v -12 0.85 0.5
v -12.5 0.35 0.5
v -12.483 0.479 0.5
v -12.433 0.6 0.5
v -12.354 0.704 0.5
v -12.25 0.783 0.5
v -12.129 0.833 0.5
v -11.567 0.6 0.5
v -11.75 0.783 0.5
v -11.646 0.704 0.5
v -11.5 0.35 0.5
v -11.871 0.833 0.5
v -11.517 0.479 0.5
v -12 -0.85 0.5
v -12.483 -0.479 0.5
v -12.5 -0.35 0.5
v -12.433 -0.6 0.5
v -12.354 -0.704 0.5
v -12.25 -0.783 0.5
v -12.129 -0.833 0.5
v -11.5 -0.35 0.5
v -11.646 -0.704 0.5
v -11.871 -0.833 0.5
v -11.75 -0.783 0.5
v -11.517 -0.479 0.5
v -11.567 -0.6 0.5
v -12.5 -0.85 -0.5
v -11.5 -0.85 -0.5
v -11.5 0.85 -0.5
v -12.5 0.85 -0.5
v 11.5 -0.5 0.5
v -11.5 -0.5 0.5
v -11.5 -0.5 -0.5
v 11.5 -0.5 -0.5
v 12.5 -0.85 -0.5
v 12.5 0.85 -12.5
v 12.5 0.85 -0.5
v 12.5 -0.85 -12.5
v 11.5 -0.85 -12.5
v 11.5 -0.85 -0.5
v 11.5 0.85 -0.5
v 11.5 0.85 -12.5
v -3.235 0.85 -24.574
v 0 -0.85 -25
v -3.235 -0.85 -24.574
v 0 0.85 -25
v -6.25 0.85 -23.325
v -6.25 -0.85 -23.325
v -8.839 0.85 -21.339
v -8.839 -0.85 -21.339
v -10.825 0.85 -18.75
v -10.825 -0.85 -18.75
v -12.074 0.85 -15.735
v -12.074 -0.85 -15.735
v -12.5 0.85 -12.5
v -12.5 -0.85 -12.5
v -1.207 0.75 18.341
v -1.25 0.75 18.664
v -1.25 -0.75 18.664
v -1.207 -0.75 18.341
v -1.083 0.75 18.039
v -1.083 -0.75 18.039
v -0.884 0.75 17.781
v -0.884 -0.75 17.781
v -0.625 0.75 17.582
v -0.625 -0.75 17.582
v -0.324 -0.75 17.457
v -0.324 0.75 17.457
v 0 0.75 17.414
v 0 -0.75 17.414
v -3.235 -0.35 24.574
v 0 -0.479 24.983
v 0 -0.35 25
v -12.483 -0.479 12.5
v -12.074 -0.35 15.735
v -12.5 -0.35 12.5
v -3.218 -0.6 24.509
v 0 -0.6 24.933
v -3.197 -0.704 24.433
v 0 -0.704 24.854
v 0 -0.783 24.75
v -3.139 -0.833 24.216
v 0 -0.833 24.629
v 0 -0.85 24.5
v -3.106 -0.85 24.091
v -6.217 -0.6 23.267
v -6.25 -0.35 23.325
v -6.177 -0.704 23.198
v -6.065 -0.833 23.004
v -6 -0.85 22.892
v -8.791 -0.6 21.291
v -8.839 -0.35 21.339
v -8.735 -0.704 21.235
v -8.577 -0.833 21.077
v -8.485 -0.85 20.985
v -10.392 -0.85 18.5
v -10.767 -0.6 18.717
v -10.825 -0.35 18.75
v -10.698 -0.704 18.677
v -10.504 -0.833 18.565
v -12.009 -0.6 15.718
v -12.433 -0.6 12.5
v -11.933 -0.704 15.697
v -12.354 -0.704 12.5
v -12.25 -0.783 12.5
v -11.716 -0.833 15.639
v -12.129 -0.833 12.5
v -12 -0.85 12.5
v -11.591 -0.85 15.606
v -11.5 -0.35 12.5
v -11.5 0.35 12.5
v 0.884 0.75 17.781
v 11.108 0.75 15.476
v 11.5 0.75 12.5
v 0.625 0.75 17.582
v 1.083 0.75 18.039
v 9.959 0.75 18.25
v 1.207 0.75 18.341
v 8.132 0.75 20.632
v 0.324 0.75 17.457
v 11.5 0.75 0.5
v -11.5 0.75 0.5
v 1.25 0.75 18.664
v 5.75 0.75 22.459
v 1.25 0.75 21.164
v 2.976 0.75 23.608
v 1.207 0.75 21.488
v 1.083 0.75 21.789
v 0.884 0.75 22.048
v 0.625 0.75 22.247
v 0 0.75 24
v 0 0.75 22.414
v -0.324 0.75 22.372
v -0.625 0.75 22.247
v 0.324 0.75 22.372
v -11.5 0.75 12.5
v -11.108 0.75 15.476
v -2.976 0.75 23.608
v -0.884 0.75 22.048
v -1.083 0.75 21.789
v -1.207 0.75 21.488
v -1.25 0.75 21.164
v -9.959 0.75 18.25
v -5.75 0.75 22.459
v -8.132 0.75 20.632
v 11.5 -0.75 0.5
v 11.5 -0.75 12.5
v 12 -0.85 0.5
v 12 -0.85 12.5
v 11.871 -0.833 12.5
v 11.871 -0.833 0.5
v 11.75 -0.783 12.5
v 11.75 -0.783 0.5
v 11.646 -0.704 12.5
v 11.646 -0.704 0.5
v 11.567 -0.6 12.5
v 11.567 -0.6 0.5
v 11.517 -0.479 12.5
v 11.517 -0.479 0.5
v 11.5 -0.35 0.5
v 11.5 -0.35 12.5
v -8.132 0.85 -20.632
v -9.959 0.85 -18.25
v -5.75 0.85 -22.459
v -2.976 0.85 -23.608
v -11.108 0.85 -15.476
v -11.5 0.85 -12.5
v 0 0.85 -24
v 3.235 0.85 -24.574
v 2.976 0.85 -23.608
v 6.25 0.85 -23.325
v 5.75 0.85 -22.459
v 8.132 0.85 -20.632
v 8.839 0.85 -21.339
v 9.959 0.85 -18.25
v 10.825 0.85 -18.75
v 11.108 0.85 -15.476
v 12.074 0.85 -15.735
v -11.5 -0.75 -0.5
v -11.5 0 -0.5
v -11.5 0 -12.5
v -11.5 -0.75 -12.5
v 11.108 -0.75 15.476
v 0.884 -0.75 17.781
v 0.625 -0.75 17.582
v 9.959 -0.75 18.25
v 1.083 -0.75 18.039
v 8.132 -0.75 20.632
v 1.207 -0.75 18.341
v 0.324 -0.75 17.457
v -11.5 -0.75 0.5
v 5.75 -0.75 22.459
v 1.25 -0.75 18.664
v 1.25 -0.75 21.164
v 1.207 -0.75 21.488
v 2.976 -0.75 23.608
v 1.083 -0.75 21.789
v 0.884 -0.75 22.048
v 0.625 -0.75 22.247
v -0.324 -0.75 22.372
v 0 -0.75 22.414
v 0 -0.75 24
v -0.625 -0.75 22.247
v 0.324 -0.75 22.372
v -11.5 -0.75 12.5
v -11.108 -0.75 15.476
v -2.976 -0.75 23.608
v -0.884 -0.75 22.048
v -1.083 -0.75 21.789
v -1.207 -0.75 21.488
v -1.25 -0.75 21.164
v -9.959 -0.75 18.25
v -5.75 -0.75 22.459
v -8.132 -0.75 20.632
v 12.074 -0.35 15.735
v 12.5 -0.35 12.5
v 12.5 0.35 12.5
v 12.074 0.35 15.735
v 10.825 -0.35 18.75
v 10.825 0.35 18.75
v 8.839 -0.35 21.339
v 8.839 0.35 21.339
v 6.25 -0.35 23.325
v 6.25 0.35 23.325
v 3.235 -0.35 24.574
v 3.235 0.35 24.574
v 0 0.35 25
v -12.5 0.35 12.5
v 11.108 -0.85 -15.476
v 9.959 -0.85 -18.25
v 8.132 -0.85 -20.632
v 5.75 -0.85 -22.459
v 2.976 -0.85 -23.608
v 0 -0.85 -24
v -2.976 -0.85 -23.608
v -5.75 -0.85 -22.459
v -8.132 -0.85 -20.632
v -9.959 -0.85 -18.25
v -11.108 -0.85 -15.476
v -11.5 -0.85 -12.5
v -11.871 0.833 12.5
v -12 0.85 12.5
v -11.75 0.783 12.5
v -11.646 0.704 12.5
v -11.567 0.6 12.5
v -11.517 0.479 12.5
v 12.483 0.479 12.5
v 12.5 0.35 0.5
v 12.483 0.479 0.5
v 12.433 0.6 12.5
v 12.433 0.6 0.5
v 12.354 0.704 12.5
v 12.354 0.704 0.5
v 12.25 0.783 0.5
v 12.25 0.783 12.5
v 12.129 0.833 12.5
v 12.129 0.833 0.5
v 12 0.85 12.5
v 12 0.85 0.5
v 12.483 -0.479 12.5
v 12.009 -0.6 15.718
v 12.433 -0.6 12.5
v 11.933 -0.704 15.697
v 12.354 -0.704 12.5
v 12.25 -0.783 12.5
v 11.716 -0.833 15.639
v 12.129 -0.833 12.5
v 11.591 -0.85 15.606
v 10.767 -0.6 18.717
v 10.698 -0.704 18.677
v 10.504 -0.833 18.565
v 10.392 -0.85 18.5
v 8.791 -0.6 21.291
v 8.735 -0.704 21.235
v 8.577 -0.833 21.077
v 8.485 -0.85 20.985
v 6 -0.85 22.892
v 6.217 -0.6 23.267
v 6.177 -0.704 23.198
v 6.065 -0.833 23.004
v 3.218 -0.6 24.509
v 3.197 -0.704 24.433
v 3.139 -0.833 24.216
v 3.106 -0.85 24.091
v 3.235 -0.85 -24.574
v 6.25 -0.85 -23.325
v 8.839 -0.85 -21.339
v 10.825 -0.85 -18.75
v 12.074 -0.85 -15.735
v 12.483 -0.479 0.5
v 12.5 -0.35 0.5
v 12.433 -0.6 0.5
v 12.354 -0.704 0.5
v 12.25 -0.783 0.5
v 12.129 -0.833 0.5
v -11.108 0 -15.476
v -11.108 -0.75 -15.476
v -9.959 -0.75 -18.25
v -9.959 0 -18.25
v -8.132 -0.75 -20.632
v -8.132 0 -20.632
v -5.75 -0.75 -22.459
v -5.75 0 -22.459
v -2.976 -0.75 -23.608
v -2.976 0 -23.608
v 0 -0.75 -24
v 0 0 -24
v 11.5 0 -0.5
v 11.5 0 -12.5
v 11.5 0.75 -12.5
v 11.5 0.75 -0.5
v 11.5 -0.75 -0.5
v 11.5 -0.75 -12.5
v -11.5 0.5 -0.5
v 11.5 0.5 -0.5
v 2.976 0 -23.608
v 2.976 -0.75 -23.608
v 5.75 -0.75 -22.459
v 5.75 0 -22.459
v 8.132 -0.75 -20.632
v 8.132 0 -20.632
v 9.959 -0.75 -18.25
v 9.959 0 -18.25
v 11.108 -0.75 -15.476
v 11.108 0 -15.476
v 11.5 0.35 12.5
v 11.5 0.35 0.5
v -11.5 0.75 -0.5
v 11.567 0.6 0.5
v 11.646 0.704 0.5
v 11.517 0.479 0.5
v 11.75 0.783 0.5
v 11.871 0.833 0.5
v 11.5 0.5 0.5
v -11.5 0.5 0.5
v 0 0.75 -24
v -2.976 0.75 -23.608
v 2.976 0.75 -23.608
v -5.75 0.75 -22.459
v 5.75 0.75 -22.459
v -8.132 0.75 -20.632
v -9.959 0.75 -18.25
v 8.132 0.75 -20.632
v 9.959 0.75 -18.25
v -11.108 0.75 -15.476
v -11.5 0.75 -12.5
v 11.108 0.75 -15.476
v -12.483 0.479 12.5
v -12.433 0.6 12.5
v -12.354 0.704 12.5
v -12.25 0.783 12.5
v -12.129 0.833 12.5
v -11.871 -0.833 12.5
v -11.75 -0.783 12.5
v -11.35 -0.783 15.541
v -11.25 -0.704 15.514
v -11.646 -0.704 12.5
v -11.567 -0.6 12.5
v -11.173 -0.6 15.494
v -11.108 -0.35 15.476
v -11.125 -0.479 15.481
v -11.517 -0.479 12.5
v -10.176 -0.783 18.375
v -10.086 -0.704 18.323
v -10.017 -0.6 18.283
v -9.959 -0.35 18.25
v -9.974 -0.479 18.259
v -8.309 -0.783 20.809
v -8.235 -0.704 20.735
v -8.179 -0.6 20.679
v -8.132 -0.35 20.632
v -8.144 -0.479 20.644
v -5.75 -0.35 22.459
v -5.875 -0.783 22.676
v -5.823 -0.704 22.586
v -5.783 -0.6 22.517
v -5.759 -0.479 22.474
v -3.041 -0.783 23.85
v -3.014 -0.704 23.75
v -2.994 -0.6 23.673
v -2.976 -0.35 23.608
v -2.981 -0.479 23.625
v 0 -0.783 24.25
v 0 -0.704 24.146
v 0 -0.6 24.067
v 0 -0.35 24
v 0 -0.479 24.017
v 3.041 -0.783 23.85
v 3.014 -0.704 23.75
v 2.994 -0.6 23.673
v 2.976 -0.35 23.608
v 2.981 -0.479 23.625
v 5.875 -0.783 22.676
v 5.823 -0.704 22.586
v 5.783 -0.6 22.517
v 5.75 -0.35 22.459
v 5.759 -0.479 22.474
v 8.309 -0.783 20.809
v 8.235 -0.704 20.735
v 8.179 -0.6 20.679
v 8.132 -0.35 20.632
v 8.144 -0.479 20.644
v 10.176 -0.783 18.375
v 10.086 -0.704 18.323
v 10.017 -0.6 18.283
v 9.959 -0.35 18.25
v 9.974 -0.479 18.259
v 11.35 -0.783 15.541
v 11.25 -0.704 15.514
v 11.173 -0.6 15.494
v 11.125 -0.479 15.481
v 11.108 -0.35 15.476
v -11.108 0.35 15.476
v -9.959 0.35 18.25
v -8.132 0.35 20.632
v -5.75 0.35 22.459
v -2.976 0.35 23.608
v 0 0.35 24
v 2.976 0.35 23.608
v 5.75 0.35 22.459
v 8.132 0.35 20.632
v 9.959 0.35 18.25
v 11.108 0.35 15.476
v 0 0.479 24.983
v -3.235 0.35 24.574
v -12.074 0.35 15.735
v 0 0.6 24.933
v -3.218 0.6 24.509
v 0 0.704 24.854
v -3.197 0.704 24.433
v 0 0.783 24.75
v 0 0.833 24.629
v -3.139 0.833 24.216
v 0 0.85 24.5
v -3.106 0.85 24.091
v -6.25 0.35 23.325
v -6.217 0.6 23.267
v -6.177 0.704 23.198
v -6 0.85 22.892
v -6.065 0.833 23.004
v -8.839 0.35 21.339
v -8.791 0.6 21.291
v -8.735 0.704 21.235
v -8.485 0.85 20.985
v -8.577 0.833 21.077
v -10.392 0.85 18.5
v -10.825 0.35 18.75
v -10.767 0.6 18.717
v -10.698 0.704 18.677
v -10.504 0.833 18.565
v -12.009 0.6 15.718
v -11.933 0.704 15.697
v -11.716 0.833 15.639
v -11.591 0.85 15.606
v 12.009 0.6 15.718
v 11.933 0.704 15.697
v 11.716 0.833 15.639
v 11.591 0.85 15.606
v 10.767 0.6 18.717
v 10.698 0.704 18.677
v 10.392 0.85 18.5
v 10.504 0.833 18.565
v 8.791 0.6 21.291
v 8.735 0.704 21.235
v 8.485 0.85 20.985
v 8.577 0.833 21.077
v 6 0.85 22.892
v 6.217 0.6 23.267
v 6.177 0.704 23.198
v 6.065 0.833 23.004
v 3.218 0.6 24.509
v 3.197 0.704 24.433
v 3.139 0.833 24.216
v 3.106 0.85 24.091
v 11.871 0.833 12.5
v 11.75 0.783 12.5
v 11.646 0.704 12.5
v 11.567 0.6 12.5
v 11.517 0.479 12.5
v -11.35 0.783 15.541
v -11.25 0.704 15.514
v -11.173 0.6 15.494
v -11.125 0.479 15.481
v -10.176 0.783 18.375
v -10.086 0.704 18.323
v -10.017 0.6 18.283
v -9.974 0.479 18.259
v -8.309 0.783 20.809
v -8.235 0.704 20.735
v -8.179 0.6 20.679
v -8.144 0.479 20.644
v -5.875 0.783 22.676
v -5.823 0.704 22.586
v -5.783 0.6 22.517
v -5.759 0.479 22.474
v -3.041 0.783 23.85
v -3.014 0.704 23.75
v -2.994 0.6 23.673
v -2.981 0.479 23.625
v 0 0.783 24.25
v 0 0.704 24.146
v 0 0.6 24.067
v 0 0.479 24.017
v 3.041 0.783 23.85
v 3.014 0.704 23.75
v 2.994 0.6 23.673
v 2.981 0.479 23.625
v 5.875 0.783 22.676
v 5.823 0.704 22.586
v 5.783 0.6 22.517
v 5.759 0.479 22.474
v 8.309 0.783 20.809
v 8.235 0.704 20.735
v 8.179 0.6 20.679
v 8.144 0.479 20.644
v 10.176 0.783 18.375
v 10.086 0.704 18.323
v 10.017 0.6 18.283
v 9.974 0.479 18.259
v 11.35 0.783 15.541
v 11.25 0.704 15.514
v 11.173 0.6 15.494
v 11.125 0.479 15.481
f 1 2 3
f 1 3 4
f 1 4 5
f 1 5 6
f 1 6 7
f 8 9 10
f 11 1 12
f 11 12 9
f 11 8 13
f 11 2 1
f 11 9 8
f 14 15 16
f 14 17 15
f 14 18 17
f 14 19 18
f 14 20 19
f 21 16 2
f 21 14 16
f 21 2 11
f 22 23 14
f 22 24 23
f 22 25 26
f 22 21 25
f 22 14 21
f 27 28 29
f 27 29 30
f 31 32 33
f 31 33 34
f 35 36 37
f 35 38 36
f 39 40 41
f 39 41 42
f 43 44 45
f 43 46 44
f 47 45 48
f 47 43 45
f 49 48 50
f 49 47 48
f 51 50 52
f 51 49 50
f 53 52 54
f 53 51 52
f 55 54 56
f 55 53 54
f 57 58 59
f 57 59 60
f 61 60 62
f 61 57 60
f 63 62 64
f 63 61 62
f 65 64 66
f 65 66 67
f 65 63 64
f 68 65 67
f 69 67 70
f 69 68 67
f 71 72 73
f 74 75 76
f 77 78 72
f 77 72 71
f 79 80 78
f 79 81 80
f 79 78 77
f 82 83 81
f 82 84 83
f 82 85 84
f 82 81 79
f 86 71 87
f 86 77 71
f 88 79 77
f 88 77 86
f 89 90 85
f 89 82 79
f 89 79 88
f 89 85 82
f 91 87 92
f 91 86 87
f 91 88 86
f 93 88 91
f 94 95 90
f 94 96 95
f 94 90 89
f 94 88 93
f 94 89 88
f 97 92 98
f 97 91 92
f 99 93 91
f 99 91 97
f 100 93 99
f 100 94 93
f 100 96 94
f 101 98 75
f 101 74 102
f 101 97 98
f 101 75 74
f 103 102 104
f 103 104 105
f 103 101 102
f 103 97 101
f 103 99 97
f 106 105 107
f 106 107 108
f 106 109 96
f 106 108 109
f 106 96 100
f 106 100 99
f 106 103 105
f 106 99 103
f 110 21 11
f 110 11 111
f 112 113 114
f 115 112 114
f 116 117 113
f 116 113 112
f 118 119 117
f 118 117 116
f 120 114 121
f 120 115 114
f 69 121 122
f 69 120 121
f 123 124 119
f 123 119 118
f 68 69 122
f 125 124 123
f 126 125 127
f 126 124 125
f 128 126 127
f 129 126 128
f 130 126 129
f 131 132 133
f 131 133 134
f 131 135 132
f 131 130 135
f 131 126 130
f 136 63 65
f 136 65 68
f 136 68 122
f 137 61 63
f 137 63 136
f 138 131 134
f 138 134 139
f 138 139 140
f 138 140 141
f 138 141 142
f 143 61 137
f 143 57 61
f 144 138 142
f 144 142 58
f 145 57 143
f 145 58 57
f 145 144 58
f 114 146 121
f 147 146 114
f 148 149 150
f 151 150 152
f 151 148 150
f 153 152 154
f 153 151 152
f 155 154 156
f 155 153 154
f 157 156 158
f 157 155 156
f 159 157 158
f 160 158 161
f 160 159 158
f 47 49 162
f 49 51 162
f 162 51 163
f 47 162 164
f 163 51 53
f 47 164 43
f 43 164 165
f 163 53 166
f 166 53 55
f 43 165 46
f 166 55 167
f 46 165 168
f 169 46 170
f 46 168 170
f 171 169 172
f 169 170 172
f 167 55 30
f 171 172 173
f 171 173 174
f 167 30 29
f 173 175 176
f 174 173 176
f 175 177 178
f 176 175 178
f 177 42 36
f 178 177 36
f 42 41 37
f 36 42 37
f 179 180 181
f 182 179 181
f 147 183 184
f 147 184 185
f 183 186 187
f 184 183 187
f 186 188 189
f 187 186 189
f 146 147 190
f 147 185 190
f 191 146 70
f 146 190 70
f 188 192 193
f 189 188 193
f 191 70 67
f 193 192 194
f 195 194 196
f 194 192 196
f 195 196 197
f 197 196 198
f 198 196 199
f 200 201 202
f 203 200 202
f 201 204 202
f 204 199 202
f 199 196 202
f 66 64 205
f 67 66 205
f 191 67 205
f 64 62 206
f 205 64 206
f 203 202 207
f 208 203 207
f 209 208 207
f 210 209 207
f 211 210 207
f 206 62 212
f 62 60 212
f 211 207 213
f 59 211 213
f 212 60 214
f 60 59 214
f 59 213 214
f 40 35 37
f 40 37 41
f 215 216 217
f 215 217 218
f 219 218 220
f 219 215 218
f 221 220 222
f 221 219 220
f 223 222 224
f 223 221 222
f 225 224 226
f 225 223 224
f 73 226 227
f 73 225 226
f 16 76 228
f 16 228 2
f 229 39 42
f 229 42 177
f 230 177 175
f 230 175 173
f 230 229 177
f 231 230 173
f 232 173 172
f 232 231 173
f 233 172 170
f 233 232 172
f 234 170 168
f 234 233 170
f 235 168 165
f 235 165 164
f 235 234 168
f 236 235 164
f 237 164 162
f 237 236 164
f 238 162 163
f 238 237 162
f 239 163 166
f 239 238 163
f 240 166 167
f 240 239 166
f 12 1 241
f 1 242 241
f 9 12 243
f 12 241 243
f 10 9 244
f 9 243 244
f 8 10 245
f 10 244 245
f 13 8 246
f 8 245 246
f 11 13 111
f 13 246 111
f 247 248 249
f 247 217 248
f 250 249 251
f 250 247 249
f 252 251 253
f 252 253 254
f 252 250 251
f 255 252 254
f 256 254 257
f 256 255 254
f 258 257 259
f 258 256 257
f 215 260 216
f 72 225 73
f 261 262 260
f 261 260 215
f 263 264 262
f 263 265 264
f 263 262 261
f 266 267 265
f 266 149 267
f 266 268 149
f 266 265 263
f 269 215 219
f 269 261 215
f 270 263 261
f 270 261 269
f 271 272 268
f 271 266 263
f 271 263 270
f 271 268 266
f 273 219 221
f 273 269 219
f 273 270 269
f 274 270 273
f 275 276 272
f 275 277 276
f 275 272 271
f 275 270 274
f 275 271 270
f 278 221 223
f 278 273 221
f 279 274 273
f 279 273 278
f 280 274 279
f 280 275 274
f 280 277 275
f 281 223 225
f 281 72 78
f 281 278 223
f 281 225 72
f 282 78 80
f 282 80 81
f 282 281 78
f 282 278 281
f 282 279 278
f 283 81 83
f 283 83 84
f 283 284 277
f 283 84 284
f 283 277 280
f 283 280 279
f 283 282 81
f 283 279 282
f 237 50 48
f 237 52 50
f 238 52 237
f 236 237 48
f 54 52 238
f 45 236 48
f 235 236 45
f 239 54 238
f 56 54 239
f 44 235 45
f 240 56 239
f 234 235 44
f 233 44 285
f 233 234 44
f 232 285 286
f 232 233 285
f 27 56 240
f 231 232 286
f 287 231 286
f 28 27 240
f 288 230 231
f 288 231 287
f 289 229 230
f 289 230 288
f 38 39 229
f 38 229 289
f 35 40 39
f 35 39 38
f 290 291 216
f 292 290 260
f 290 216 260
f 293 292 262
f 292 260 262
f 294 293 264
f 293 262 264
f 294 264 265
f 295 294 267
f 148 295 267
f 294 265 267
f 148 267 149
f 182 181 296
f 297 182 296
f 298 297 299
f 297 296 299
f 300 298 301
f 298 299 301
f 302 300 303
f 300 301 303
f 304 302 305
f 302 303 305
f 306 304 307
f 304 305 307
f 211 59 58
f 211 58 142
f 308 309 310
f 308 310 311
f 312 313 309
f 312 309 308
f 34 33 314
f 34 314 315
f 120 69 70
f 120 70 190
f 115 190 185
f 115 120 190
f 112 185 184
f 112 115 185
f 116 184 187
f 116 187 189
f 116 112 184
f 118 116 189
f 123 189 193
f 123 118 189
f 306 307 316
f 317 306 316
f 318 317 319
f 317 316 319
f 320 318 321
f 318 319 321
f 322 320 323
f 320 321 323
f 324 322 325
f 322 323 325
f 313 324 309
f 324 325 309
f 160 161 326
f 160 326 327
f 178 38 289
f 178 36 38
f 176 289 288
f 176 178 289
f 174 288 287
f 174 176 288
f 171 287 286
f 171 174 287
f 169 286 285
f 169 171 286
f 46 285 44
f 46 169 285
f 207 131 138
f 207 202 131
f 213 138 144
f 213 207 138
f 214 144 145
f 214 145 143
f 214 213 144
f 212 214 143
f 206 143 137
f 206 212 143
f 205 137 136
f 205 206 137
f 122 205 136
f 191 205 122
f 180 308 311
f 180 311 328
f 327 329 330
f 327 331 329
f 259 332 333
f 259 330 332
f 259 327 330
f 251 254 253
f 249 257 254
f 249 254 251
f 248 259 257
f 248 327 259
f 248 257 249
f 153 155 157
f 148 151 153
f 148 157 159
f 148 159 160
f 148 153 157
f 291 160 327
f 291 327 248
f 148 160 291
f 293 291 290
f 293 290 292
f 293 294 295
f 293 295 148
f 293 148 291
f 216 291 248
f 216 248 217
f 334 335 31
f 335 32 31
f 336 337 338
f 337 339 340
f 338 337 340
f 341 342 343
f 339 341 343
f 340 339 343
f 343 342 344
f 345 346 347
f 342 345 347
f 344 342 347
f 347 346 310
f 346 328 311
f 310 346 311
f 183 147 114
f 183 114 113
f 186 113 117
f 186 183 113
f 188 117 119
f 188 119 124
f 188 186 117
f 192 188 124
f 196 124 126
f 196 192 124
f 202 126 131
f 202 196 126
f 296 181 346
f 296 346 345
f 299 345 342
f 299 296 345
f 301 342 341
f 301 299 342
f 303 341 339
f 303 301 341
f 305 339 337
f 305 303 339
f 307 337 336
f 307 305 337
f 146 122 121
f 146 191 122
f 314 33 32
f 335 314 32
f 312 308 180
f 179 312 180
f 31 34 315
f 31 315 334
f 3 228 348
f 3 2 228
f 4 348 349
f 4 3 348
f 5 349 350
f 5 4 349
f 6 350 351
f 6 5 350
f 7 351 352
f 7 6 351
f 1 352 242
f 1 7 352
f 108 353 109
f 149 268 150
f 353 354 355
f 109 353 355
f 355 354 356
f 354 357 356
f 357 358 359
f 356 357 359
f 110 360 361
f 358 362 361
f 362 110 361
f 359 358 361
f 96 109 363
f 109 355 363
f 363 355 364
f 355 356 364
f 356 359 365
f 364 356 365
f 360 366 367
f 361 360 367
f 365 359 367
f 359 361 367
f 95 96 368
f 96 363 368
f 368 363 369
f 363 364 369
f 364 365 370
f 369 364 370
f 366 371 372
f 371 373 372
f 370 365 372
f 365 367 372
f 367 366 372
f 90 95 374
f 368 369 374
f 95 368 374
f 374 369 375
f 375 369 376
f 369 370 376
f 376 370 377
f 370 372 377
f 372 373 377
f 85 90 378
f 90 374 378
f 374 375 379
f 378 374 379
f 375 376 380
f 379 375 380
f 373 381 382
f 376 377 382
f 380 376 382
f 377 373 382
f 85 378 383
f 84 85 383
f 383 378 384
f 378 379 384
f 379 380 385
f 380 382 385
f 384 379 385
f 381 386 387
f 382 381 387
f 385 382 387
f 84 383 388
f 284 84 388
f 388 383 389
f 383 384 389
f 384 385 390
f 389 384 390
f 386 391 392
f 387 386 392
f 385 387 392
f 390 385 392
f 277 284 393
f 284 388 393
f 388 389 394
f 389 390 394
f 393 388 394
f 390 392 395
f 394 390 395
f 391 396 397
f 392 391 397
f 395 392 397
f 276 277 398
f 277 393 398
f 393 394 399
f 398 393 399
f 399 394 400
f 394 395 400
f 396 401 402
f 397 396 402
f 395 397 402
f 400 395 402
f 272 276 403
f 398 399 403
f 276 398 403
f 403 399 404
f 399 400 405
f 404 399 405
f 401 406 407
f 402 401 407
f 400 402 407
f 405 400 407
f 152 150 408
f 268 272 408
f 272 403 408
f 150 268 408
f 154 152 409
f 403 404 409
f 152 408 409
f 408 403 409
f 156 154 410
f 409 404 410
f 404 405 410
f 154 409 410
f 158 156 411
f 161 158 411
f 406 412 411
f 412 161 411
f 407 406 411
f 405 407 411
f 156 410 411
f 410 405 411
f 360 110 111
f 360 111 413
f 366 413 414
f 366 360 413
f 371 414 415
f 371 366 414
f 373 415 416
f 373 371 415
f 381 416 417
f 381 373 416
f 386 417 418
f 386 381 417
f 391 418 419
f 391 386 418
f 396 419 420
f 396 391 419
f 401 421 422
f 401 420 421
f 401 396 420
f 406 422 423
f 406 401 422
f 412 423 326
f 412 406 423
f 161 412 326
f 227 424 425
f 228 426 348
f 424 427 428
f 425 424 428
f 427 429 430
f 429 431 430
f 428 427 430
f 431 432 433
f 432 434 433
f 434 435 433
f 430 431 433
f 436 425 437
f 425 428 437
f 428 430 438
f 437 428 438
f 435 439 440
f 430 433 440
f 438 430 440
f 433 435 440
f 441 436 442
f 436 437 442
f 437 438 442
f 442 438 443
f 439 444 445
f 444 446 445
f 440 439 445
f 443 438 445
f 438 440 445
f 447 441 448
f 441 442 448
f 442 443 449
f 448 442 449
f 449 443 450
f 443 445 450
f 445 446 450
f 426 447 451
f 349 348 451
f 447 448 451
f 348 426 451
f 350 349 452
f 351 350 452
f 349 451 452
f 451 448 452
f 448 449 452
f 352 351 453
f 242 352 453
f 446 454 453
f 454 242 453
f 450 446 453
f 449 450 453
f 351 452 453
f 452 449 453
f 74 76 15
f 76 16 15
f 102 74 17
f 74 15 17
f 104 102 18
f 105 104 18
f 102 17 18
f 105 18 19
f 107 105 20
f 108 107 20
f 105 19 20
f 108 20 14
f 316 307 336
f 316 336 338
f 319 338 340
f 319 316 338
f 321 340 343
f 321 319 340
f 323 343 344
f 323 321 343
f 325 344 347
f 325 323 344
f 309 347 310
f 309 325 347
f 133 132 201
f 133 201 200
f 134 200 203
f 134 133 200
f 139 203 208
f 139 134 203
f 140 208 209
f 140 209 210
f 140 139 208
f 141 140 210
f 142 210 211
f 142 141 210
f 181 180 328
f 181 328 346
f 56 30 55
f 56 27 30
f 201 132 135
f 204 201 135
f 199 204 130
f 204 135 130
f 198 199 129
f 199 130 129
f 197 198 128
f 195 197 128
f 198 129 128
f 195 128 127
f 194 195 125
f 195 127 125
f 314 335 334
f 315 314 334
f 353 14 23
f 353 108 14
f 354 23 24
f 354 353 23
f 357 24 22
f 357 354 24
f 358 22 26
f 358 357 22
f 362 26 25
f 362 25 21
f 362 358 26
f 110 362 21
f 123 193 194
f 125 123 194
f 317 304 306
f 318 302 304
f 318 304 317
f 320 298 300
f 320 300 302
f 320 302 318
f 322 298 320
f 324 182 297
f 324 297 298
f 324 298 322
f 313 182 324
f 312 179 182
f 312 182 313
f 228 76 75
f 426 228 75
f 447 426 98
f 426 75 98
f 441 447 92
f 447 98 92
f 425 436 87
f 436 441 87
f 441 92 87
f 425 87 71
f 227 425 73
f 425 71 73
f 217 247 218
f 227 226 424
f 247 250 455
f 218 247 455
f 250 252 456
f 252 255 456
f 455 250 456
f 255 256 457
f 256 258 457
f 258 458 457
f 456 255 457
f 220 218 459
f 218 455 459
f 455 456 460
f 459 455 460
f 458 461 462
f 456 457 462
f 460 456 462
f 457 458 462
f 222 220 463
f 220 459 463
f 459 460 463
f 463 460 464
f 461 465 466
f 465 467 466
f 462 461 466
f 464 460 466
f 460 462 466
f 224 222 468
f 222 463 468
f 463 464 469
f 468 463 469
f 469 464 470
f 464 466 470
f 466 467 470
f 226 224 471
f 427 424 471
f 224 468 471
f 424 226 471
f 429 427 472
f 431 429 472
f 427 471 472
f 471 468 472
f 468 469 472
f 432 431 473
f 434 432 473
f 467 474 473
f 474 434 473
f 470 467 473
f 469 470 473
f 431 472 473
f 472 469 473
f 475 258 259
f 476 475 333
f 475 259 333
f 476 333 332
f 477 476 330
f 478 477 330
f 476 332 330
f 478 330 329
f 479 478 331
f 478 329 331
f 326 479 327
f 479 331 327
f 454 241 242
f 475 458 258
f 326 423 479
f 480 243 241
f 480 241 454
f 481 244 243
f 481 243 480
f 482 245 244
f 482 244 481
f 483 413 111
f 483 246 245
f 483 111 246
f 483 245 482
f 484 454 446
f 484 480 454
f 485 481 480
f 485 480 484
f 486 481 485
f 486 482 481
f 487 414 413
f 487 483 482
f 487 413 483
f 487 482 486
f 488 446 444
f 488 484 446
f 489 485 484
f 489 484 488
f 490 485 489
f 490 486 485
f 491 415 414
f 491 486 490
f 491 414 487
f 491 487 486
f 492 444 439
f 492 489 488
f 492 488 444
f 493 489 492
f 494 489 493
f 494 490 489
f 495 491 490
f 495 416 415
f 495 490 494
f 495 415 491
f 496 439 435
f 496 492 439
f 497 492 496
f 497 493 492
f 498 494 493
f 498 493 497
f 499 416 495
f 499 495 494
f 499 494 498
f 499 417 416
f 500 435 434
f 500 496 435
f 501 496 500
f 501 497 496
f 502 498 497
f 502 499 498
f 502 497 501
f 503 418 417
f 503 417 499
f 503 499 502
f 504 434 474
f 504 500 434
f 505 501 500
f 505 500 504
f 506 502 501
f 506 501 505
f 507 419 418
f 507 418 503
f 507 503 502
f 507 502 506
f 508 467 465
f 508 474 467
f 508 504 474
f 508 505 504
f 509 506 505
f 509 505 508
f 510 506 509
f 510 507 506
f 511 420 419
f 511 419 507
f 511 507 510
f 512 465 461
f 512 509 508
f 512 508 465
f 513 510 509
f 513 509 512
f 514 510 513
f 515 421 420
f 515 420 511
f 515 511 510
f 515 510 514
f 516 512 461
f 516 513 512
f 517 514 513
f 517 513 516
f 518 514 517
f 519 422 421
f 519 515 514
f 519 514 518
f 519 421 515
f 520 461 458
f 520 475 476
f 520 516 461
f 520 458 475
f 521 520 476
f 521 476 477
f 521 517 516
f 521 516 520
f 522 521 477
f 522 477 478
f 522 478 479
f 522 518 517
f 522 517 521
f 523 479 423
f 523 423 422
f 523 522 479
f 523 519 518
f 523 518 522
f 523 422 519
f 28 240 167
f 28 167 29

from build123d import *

# Parameters (mm, degrees)
F1_DEPTH      = 0.85
F1_DEPTH_BACK = 0.85
F2_R          = 12.49999
F2_2_R        = 12.49999
F0_W          = 23
F0_H          = 1
F3_DEPTH      = 0.5
F3_DEPTH_BACK = 0.5
F0_W_2        = 2.5
F0_H_2        = 5
F4_DEPTH      = 0.75
F4_DEPTH_BACK = 0.75
F5_T1_DEPTH   = 1.5
F6_R          = 0.49999


# Not quite as in the source:
# - a fillet or chamfer that OpenCascade refuses, or shapes differently, is made with other operations: its cross-section is extruded or revolved along the edge and cut away or added
# - a fillet or chamfer is up to 0.001 mm smaller than in the source, because OpenCascade refuses the exact size
# - a feature names something its author has since deleted; it is built from what else it names


with BuildPart() as f1:
    # F0 (on Front) → F1 (new body, two sides)
    with BuildSketch(Plane.XZ) as f1_sk:
        with BuildLine():
            Line((12.5, 0.5), (12.5, 25))
            Line((12.5, 25), (-12.5, 25))
            Line((-12.5, 25), (-12.5, 0.5))
            Line((-12.5, 0.5), (-11.5, 0.5))
            Line((-11.5, 0.5), (-11.5, 12.5))
            ThreePointArc((-11.5, 12.5), (-8.1317279836, 20.6317279836), (0, 24))
            ThreePointArc((0, 24), (8.1317279836, 20.6317279836), (11.5, 12.5))
            Line((11.5, 12.5), (11.5, 0.5))
            Line((11.5, 0.5), (12.5, 0.5))
        make_face()
    extrude(amount=F1_DEPTH)
    extrude(f1_sk.sketch, amount=-F1_DEPTH_BACK)

    # F2 (radius 12.5 in the source; OpenCascade refuses exactly that, so slightly less here)
    f2_edges = [f1.edges().sort_by_distance(p)[0] for p in [
        (12.5, 0, 25),
        (-12.5, 0, 25),
    ]]
    fillet(f2_edges, radius=F2_R)

    # F6 (radius 0.5 in the source; OpenCascade refuses exactly that, so slightly less here)
    f6_edges = [f1.edges().sort_by_distance(p)[0] for p in [
        (8.838838, -0.85, 21.338838),
        (12.5, -0.85, 6.500005),
        (12.5, 0.85, 6.500005),
        (8.838838, 0.85, 21.338838),
        (-12.5, -0.85, 6.500005),
        (-12.5, 0.85, 6.500005),
        (-11.5, -0.85, 6.5),
        (0, -0.85, 24),
        (11.5, 0.85, 6.5),
        (0, 0.85, 24),
        (-11.5, 0.85, 6.5),
        (11.5, -0.85, 6.5),
        (0, -0.85, 25),
        (-8.838838, -0.85, 21.338838),
        (0, 0.85, 25),
        (-8.838838, 0.85, 21.338838),
    ]]
    fillet(f6_edges, radius=F6_R)


with BuildPart() as f1b:
    # F0 (on Front) → F1, piece 2 (new body, two sides)
    with BuildSketch(Plane.XZ) as f1_2_sk:
        with BuildLine():
            Line((12.5, -25), (12.5, -0.5))
            Line((12.5, -0.5), (11.5, -0.5))
            Line((11.5, -0.5), (11.5, -12.5))
            ThreePointArc((11.5, -12.5), (8.1317279836, -20.6317279836), (0, -24))
            ThreePointArc((0, -24), (-8.1317279836, -20.6317279836), (-11.5, -12.5))
            Line((-11.5, -12.5), (-11.5, -0.5))
            Line((-11.5, -0.5), (-12.5, -0.5))
            Line((-12.5, -0.5), (-12.5, -25))
            Line((-12.5, -25), (12.5, -25))
        make_face()
    extrude(amount=F1_DEPTH)
    extrude(f1_2_sk.sketch, amount=-F1_DEPTH_BACK)

    # F2#2 (radius 12.5 in the source; OpenCascade refuses exactly that, so slightly less here)
    f2_2_edges = [f1b.edges().sort_by_distance(p)[0] for p in [
        (12.5, 0, -25),
        (-12.5, 0, -25),
    ]]
    fillet(f2_2_edges, radius=F2_2_R)


with BuildPart() as f3:
    # F0 (on Front) → F3 (new body, two sides)
    with BuildSketch(Plane.XZ) as f3_sk:
        Rectangle(F0_W, F0_H)
    extrude(amount=F3_DEPTH)
    extrude(f3_sk.sketch, amount=-F3_DEPTH_BACK)


with BuildPart() as f4:
    # F0 (on Front) → F4 (new body, two sides)
    with BuildSketch(Plane.XZ) as f4_sk:
        with BuildLine():
            Line((-11.5, 0.5), (11.5, 0.5))
            Line((11.5, 0.5), (11.5, 12.5))
            ThreePointArc((11.5, 12.5), (8.1317279836, 20.6317279836), (0, 24))
            ThreePointArc((0, 24), (-8.1317279836, 20.6317279836), (-11.5, 12.5))
            Line((-11.5, 12.5), (-11.5, 0.5))
        make_face()
        with Locations((0, 19.9144259095)):
            Rectangle(F0_W_2, F0_H_2, mode=Mode.SUBTRACT)
    extrude(amount=F4_DEPTH)
    extrude(f4_sk.sketch, amount=-F4_DEPTH_BACK)

    # F5: fillet of radius 1.25 on 4 edges, made by hand

    # F5_s2 → F5_t1 (join)
    with BuildSketch(Plane.XZ.offset(-0.75)):
        with BuildLine():
            ThreePointArc((0, 22.4144259095), (-0.8838834765, 22.048309386), (-1.25, 21.1644259095))
            Line((-1.25, 21.1644259095), (-1.25, 22.4144259095))
            Line((-1.25, 22.4144259095), (0, 22.4144259095))
        make_face()
        with BuildLine():
            ThreePointArc((0, 22.4144259095), (0.8838834765, 22.048309386), (1.25, 21.1644259095))
            Line((1.25, 21.1644259095), (1.25, 22.4144259095))
            Line((1.25, 22.4144259095), (0, 22.4144259095))
        make_face()
        with BuildLine():
            ThreePointArc((-1.25, 18.6644259095), (-0.8838834765, 17.780542433), (0, 17.4144259095))
            Line((0, 17.4144259095), (-1.25, 17.4144259095))
            Line((-1.25, 17.4144259095), (-1.25, 18.6644259095))
        make_face()
        with BuildLine():
            ThreePointArc((0, 17.4144259095), (0.8838834765, 17.780542433), (1.25, 18.6644259095))
            Line((1.25, 18.6644259095), (1.25, 17.4144259095))
            Line((1.25, 17.4144259095), (0, 17.4144259095))
        make_face()
    extrude(amount=F5_T1_DEPTH)


with BuildPart() as f4b:
    # F0 (on Front) → F4, piece 2 (new body, two sides)
    with BuildSketch(Plane.XZ) as f4_2_sk:
        with BuildLine():
            Line((11.5, -12.5), (11.5, -0.5))
            Line((11.5, -0.5), (-11.5, -0.5))
            Line((-11.5, -0.5), (-11.5, -12.5))
            ThreePointArc((-11.5, -12.5), (-8.1317279836, -20.6317279836), (0, -24))
            ThreePointArc((0, -24), (8.1317279836, -20.6317279836), (11.5, -12.5))
        make_face()
    extrude(amount=F4_DEPTH)
    extrude(f4_2_sk.sketch, amount=-F4_DEPTH_BACK)


solid = Compound([f1.part, f1b.part, f3.part, f4.part, f4b.part])
